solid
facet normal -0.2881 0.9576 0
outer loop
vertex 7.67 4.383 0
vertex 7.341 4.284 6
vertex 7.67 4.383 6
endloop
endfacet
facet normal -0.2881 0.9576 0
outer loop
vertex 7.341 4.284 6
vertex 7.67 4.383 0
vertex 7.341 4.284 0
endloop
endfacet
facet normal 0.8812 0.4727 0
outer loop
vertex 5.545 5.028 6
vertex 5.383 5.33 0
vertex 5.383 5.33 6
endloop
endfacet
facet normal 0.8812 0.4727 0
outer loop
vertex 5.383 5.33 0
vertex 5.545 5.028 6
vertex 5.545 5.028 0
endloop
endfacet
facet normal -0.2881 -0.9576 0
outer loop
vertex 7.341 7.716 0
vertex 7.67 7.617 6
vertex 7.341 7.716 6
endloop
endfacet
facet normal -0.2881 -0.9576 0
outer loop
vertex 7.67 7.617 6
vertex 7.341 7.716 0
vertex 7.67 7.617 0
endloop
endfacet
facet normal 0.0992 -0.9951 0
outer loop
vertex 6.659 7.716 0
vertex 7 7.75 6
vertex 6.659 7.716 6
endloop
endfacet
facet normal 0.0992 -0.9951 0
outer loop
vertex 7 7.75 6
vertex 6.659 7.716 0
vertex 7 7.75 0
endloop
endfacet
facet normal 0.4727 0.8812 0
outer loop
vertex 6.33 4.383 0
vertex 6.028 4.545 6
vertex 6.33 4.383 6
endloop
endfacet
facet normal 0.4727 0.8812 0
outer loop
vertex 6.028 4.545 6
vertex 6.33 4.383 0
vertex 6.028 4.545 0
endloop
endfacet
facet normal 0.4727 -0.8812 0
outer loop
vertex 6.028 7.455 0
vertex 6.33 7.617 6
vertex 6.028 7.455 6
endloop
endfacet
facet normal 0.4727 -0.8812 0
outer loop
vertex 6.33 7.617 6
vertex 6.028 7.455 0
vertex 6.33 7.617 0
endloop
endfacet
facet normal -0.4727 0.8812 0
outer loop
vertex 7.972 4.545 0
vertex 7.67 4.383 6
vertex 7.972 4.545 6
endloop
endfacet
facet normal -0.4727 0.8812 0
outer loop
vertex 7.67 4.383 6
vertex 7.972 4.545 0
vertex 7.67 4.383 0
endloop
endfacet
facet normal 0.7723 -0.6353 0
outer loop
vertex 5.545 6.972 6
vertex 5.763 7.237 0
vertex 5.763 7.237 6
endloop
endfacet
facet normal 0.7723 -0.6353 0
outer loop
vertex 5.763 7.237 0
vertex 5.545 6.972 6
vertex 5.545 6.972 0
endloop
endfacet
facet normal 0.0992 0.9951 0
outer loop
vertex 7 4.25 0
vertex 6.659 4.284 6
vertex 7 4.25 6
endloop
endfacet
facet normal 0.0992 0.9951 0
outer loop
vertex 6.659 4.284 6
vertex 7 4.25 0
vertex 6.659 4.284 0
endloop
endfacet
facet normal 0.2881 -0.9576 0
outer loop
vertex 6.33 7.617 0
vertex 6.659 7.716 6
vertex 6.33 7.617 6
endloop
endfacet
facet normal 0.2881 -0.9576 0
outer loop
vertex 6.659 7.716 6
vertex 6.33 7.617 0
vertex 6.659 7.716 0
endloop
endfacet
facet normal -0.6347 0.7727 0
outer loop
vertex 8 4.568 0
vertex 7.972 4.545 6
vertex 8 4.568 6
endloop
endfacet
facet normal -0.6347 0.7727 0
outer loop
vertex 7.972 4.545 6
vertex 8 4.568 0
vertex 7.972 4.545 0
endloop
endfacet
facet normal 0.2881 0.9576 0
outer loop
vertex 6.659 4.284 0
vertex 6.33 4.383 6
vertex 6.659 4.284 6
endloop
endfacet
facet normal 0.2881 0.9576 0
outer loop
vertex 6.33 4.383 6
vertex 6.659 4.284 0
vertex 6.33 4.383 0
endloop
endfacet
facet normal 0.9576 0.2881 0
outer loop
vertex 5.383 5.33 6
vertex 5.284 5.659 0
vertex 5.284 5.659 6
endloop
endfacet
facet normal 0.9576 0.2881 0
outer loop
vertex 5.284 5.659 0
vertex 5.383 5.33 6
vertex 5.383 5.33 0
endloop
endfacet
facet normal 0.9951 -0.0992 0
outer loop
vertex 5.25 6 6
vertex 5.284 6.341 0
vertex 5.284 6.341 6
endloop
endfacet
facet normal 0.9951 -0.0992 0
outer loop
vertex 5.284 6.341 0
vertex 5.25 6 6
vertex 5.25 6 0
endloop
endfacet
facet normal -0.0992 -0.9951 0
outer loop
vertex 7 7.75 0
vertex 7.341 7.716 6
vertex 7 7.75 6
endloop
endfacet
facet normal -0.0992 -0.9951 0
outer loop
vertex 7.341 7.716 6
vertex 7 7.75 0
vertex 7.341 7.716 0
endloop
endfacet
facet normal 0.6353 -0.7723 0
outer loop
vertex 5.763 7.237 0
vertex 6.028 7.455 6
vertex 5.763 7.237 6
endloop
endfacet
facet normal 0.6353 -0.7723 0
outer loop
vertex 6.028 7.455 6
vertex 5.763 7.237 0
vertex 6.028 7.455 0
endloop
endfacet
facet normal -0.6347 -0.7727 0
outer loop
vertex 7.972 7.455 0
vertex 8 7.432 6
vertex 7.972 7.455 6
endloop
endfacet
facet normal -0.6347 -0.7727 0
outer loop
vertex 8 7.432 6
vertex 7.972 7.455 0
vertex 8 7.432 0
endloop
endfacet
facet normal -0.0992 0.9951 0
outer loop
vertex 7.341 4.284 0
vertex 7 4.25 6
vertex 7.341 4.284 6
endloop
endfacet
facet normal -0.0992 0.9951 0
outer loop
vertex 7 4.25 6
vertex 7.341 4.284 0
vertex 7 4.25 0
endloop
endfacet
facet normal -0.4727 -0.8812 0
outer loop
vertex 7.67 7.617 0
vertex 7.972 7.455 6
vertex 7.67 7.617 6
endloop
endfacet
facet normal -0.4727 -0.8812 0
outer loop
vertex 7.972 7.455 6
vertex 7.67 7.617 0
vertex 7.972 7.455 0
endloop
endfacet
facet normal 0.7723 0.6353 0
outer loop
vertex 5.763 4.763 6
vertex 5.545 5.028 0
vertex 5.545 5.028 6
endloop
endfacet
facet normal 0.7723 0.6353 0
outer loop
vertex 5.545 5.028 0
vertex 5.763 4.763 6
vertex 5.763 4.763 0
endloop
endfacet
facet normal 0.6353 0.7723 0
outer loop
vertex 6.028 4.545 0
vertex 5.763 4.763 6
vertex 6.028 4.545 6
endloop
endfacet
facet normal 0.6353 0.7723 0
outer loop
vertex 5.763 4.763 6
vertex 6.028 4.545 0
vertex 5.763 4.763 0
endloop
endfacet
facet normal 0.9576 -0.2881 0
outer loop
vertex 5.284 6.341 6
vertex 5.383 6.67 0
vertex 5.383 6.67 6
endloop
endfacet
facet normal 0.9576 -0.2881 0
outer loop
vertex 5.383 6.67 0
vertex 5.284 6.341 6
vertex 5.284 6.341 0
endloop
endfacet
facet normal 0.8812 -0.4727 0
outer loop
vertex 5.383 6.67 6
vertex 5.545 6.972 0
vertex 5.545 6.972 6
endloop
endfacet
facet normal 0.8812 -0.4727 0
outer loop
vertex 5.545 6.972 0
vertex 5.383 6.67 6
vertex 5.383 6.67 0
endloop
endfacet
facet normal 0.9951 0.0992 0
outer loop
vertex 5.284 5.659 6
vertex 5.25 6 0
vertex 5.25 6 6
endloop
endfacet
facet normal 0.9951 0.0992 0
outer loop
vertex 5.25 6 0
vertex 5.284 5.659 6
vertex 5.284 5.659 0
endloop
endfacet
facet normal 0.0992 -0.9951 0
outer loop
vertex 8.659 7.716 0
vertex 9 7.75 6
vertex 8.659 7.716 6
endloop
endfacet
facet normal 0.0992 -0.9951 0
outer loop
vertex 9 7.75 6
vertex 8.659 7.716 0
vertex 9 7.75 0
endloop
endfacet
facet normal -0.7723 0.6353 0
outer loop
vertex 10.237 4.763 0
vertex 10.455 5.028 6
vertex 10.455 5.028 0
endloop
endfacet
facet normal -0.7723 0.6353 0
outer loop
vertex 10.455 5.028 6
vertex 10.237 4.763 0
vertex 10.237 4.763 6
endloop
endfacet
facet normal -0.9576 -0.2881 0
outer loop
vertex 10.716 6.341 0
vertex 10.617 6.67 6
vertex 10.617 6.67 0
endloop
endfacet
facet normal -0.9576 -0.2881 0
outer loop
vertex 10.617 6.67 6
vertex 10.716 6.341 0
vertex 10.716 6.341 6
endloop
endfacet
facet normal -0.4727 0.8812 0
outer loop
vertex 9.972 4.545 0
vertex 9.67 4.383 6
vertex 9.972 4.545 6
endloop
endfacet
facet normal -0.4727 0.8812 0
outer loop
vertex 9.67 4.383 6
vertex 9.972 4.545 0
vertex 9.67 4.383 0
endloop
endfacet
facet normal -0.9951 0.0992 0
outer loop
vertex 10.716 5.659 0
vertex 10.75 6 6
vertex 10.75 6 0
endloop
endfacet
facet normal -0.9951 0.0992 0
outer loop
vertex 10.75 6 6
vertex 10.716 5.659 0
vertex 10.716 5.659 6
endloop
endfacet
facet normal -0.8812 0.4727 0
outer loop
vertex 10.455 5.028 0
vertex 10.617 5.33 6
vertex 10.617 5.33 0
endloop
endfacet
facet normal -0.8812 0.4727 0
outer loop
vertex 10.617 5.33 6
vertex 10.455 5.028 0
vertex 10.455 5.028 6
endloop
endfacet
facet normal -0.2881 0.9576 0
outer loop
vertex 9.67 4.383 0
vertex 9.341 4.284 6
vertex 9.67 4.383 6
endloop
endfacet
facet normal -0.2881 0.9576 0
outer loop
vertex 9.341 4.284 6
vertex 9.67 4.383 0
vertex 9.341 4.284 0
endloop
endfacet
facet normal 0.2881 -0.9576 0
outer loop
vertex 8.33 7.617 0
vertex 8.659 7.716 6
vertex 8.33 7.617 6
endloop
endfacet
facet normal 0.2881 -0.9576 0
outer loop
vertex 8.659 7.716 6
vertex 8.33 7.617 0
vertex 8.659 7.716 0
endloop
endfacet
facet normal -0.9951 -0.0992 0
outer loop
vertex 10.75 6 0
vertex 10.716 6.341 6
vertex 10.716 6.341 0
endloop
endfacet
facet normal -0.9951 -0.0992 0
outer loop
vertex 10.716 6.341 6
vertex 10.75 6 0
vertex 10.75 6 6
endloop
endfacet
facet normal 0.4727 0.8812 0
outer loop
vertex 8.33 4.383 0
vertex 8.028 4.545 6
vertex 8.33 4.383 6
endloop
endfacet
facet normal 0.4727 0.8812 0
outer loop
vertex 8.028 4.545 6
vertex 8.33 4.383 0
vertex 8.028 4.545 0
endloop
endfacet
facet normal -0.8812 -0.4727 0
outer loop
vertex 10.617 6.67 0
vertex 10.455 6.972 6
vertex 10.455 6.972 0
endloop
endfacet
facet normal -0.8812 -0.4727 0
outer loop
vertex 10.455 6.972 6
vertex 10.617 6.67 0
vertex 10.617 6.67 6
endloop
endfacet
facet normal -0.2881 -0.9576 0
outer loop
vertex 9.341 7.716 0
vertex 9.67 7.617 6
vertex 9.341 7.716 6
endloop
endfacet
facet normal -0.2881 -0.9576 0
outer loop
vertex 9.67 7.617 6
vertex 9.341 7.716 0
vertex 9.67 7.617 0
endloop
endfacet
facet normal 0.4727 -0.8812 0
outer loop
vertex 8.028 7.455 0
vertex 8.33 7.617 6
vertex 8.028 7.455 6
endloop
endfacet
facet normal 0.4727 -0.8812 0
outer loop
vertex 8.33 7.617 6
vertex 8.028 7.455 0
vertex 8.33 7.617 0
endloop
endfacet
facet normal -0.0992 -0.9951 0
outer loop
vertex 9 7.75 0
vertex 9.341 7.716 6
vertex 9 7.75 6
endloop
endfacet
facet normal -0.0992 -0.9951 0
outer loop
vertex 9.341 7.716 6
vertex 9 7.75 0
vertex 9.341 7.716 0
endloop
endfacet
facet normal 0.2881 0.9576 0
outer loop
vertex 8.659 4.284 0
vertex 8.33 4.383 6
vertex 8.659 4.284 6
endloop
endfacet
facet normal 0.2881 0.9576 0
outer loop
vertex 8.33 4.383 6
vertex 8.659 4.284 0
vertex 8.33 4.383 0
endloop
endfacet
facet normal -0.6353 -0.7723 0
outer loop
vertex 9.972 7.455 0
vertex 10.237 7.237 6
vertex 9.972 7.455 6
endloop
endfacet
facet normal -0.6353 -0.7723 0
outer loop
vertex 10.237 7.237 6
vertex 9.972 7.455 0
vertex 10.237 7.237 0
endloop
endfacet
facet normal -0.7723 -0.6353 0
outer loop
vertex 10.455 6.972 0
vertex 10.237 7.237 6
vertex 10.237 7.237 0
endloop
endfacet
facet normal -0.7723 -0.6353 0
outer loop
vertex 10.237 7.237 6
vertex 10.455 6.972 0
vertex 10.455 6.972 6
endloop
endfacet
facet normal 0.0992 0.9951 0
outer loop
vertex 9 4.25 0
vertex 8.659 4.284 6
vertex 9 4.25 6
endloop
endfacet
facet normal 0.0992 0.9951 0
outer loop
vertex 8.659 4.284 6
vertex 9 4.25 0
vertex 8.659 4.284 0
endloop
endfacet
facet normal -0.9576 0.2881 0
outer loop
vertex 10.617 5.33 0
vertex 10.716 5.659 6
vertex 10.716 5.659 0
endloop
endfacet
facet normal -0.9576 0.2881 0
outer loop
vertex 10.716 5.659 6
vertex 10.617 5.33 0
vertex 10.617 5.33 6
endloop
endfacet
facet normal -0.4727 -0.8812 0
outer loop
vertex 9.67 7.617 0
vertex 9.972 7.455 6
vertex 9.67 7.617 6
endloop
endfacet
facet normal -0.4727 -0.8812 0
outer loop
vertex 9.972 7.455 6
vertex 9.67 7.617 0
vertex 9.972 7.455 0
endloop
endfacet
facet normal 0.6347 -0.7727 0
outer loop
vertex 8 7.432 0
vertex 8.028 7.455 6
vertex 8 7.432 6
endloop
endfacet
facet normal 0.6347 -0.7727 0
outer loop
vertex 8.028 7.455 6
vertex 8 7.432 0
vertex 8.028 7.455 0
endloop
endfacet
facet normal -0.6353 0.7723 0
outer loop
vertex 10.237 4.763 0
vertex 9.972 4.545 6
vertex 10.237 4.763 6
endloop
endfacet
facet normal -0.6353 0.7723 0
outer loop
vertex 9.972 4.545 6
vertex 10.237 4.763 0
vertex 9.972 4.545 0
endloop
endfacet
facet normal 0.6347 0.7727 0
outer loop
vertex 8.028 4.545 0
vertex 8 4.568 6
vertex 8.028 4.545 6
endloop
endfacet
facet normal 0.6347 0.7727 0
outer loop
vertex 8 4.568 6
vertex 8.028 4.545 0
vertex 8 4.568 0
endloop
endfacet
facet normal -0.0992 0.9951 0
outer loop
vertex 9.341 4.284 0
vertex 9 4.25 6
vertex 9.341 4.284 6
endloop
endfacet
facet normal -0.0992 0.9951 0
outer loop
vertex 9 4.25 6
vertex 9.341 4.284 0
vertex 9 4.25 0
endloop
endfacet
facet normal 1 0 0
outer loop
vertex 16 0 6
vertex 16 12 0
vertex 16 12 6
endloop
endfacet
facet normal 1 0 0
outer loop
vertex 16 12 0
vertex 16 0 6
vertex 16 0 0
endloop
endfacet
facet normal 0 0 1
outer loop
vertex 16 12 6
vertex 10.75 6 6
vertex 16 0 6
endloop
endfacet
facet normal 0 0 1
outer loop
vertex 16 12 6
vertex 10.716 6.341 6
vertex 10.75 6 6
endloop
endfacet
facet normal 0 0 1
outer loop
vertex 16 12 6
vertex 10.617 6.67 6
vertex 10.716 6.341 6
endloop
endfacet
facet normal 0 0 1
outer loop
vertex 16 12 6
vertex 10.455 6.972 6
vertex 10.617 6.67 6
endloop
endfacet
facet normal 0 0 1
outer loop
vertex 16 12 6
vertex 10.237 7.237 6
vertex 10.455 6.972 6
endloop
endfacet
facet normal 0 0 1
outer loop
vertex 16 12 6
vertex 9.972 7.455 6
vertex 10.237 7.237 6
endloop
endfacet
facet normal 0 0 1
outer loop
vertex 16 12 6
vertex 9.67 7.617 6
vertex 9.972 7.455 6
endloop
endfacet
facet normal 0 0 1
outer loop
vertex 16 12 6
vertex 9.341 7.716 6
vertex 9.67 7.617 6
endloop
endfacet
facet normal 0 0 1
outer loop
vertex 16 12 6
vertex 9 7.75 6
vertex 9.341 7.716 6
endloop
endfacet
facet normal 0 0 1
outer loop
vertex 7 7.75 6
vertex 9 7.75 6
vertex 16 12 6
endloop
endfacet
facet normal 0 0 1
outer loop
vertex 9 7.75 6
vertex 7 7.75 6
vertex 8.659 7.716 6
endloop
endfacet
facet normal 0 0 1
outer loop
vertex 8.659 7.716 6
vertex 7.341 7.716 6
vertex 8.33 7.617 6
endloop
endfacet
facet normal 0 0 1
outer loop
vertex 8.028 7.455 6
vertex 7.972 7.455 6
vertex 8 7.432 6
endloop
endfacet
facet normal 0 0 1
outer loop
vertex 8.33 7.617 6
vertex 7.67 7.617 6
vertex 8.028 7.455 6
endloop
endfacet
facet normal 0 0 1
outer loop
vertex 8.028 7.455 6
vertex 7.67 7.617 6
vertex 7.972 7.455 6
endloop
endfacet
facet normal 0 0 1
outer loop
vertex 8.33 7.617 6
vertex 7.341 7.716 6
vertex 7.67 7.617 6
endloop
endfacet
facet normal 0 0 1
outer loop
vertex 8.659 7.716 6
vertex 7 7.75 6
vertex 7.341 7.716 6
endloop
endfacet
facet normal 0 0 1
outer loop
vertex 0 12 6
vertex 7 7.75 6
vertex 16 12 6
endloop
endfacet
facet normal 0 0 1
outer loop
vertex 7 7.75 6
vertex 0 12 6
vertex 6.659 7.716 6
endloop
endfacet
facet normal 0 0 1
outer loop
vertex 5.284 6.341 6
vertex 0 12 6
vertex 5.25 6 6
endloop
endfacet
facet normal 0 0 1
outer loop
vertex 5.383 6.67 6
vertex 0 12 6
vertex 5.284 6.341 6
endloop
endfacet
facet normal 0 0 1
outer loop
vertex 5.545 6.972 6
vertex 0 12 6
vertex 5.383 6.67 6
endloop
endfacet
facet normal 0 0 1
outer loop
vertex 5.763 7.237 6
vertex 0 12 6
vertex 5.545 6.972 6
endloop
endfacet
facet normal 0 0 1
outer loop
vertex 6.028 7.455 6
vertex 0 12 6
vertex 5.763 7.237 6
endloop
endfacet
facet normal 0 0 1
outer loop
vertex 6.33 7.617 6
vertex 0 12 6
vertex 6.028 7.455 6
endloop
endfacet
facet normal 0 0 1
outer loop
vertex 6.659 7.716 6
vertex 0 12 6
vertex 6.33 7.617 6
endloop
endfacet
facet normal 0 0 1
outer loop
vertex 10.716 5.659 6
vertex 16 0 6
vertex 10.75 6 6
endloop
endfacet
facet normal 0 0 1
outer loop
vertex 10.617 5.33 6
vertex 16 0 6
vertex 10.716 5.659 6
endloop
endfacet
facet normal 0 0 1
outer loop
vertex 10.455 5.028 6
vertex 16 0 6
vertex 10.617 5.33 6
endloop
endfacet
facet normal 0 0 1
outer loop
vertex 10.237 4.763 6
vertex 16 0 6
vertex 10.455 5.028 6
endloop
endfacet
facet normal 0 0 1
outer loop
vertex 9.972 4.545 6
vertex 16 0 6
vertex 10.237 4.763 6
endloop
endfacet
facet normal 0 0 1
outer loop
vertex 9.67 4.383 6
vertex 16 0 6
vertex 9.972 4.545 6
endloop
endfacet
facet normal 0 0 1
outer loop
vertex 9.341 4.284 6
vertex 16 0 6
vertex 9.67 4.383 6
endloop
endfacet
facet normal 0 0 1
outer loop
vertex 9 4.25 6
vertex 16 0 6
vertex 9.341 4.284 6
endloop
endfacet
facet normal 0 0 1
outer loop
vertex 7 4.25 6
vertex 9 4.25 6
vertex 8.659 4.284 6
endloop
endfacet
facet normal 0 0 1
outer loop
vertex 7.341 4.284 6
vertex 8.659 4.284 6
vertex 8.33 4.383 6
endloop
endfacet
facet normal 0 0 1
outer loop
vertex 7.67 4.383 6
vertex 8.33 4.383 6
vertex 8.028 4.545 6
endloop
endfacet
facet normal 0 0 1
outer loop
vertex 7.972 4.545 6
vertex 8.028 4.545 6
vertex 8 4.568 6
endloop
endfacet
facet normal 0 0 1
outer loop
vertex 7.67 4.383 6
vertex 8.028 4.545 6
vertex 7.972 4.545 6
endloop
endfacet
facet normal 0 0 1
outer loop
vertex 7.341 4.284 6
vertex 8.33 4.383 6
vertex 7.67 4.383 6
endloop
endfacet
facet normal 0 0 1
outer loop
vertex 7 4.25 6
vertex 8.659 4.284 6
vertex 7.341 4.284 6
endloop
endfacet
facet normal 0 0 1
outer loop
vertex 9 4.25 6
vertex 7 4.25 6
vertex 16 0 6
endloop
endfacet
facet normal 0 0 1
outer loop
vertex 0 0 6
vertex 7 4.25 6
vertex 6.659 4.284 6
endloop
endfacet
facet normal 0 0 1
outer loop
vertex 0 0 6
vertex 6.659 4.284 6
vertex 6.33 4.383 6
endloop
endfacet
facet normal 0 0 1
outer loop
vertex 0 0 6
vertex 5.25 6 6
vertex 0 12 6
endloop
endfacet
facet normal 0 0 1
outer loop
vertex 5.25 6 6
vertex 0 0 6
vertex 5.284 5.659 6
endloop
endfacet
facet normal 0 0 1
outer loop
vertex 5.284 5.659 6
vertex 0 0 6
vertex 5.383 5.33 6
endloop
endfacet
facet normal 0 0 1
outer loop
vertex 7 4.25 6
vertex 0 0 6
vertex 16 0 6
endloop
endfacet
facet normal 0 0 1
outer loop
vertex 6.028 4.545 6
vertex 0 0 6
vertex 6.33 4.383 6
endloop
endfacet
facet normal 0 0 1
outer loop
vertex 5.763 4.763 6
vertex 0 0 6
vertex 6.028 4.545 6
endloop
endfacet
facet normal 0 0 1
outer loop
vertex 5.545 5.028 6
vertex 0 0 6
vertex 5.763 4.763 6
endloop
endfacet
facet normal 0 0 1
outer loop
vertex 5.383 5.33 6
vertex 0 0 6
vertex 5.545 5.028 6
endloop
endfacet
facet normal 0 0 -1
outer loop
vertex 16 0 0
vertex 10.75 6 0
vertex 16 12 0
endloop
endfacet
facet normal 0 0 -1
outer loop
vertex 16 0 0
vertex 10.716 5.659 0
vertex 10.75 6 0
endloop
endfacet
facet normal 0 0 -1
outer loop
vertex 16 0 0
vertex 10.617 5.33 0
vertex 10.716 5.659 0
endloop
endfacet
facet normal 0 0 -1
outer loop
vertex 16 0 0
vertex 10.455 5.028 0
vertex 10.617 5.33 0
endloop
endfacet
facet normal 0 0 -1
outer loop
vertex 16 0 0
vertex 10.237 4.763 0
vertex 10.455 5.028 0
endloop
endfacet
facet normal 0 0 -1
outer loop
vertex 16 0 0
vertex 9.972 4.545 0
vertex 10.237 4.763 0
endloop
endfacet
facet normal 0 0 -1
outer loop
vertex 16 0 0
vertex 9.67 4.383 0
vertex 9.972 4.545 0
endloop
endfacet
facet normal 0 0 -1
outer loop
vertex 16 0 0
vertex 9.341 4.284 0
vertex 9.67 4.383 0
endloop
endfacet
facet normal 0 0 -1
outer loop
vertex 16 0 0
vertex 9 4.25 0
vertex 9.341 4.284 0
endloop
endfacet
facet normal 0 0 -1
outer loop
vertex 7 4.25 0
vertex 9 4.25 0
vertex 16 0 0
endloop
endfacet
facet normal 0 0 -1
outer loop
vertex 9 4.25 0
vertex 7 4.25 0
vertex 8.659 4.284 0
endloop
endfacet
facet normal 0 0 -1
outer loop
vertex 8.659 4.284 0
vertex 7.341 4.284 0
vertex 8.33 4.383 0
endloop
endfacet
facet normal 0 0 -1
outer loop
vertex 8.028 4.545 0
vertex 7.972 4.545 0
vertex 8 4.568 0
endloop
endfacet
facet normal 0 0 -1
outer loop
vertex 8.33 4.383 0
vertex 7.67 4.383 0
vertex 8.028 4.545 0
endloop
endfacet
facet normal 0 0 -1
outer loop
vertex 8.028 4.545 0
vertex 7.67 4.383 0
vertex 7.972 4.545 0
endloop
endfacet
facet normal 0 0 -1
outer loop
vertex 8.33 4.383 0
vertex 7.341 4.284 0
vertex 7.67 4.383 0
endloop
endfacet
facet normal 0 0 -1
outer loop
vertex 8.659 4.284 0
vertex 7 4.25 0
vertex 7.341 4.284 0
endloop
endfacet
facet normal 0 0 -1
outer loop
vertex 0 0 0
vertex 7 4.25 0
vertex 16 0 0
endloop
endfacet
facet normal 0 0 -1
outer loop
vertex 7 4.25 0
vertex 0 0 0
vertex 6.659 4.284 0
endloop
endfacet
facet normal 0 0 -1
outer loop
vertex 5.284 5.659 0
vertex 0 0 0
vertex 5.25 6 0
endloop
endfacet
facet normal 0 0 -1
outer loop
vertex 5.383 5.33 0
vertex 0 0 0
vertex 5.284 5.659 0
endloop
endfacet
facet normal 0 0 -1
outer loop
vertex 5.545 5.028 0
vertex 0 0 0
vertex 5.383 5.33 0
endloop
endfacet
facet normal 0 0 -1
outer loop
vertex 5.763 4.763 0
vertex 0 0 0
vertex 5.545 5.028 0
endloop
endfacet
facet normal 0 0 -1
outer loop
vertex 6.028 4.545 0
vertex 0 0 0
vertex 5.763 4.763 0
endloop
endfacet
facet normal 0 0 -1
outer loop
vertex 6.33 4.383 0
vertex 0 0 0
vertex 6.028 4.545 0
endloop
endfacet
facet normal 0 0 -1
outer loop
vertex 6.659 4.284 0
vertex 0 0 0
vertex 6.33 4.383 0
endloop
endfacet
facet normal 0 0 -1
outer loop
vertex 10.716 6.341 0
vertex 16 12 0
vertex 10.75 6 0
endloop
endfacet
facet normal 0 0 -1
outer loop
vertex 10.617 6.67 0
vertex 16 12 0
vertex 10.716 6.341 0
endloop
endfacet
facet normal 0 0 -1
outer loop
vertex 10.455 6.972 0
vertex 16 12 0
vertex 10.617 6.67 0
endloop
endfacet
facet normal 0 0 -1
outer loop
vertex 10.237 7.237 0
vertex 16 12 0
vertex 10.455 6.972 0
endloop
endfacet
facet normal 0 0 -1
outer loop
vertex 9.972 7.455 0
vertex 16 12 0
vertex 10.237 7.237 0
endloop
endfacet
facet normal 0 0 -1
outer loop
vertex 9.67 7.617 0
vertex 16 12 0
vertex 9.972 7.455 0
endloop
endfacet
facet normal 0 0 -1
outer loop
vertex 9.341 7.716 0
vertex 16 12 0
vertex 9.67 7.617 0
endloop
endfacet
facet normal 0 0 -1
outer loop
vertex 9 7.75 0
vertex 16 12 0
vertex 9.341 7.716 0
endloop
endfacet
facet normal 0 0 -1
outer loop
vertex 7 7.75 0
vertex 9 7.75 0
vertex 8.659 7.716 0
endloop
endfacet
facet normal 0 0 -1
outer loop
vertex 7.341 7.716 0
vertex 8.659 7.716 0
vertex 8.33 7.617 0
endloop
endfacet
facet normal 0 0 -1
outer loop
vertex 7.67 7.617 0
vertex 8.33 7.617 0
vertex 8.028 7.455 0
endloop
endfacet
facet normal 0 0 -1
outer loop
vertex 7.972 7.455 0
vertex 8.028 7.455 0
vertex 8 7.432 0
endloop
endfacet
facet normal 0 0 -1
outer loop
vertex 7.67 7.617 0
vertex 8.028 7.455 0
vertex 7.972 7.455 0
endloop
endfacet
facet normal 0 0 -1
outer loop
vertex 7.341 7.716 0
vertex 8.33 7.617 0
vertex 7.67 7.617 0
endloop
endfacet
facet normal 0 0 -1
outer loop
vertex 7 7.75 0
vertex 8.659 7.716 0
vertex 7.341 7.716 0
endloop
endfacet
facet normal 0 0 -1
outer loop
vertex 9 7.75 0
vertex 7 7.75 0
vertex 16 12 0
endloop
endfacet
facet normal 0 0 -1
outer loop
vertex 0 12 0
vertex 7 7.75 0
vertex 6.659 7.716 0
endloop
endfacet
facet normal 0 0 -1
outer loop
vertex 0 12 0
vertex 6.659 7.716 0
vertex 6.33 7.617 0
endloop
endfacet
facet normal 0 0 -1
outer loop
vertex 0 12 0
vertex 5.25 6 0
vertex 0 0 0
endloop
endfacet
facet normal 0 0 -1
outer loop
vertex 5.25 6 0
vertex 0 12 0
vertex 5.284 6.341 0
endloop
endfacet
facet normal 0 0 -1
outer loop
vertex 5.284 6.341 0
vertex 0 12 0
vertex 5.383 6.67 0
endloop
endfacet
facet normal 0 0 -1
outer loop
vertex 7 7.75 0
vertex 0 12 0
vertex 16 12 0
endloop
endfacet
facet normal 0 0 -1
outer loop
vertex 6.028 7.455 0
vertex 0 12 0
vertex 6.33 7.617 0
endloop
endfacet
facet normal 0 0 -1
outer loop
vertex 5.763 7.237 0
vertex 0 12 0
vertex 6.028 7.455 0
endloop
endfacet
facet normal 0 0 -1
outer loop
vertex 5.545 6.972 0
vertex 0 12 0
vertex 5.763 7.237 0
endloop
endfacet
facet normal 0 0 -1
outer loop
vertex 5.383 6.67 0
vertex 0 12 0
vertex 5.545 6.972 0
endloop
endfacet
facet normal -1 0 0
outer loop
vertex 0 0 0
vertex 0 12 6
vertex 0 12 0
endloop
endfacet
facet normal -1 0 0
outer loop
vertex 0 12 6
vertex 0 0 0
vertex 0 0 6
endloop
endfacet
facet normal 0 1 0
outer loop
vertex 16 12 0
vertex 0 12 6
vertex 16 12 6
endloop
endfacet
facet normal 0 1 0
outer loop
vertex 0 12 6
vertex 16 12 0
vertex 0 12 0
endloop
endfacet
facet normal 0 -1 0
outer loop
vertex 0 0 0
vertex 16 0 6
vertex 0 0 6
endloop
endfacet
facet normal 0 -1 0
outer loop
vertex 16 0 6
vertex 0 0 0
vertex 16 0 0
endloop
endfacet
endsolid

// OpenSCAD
$fn = 32;

// ----------------------------------------------------------------------
// Micro pad: two-hole pad, 5-20 mm class
// ----------------------------------------------------------------------

// --- parameters (mm) ---
pad_l = 16;               // pad length, X
pad_w = 12;               // pad width, Y
pad_t = 6;                // pad thickness, Z
hole_d = 3.5;             // hole diameter
hole_x = 7;               // X of the first hole centre
fit_tol = 0.02;           // tolerance for press fits, mm
free_tol = 0.2;           // tolerance for clearance fits, mm

difference() {
  cube([pad_l, pad_w, pad_t]);
  for (x = [hole_x, pad_l - hole_x])
    translate([x, pad_w / 2, -1])
      cylinder(h = pad_t + 2, d = hole_d);
}
